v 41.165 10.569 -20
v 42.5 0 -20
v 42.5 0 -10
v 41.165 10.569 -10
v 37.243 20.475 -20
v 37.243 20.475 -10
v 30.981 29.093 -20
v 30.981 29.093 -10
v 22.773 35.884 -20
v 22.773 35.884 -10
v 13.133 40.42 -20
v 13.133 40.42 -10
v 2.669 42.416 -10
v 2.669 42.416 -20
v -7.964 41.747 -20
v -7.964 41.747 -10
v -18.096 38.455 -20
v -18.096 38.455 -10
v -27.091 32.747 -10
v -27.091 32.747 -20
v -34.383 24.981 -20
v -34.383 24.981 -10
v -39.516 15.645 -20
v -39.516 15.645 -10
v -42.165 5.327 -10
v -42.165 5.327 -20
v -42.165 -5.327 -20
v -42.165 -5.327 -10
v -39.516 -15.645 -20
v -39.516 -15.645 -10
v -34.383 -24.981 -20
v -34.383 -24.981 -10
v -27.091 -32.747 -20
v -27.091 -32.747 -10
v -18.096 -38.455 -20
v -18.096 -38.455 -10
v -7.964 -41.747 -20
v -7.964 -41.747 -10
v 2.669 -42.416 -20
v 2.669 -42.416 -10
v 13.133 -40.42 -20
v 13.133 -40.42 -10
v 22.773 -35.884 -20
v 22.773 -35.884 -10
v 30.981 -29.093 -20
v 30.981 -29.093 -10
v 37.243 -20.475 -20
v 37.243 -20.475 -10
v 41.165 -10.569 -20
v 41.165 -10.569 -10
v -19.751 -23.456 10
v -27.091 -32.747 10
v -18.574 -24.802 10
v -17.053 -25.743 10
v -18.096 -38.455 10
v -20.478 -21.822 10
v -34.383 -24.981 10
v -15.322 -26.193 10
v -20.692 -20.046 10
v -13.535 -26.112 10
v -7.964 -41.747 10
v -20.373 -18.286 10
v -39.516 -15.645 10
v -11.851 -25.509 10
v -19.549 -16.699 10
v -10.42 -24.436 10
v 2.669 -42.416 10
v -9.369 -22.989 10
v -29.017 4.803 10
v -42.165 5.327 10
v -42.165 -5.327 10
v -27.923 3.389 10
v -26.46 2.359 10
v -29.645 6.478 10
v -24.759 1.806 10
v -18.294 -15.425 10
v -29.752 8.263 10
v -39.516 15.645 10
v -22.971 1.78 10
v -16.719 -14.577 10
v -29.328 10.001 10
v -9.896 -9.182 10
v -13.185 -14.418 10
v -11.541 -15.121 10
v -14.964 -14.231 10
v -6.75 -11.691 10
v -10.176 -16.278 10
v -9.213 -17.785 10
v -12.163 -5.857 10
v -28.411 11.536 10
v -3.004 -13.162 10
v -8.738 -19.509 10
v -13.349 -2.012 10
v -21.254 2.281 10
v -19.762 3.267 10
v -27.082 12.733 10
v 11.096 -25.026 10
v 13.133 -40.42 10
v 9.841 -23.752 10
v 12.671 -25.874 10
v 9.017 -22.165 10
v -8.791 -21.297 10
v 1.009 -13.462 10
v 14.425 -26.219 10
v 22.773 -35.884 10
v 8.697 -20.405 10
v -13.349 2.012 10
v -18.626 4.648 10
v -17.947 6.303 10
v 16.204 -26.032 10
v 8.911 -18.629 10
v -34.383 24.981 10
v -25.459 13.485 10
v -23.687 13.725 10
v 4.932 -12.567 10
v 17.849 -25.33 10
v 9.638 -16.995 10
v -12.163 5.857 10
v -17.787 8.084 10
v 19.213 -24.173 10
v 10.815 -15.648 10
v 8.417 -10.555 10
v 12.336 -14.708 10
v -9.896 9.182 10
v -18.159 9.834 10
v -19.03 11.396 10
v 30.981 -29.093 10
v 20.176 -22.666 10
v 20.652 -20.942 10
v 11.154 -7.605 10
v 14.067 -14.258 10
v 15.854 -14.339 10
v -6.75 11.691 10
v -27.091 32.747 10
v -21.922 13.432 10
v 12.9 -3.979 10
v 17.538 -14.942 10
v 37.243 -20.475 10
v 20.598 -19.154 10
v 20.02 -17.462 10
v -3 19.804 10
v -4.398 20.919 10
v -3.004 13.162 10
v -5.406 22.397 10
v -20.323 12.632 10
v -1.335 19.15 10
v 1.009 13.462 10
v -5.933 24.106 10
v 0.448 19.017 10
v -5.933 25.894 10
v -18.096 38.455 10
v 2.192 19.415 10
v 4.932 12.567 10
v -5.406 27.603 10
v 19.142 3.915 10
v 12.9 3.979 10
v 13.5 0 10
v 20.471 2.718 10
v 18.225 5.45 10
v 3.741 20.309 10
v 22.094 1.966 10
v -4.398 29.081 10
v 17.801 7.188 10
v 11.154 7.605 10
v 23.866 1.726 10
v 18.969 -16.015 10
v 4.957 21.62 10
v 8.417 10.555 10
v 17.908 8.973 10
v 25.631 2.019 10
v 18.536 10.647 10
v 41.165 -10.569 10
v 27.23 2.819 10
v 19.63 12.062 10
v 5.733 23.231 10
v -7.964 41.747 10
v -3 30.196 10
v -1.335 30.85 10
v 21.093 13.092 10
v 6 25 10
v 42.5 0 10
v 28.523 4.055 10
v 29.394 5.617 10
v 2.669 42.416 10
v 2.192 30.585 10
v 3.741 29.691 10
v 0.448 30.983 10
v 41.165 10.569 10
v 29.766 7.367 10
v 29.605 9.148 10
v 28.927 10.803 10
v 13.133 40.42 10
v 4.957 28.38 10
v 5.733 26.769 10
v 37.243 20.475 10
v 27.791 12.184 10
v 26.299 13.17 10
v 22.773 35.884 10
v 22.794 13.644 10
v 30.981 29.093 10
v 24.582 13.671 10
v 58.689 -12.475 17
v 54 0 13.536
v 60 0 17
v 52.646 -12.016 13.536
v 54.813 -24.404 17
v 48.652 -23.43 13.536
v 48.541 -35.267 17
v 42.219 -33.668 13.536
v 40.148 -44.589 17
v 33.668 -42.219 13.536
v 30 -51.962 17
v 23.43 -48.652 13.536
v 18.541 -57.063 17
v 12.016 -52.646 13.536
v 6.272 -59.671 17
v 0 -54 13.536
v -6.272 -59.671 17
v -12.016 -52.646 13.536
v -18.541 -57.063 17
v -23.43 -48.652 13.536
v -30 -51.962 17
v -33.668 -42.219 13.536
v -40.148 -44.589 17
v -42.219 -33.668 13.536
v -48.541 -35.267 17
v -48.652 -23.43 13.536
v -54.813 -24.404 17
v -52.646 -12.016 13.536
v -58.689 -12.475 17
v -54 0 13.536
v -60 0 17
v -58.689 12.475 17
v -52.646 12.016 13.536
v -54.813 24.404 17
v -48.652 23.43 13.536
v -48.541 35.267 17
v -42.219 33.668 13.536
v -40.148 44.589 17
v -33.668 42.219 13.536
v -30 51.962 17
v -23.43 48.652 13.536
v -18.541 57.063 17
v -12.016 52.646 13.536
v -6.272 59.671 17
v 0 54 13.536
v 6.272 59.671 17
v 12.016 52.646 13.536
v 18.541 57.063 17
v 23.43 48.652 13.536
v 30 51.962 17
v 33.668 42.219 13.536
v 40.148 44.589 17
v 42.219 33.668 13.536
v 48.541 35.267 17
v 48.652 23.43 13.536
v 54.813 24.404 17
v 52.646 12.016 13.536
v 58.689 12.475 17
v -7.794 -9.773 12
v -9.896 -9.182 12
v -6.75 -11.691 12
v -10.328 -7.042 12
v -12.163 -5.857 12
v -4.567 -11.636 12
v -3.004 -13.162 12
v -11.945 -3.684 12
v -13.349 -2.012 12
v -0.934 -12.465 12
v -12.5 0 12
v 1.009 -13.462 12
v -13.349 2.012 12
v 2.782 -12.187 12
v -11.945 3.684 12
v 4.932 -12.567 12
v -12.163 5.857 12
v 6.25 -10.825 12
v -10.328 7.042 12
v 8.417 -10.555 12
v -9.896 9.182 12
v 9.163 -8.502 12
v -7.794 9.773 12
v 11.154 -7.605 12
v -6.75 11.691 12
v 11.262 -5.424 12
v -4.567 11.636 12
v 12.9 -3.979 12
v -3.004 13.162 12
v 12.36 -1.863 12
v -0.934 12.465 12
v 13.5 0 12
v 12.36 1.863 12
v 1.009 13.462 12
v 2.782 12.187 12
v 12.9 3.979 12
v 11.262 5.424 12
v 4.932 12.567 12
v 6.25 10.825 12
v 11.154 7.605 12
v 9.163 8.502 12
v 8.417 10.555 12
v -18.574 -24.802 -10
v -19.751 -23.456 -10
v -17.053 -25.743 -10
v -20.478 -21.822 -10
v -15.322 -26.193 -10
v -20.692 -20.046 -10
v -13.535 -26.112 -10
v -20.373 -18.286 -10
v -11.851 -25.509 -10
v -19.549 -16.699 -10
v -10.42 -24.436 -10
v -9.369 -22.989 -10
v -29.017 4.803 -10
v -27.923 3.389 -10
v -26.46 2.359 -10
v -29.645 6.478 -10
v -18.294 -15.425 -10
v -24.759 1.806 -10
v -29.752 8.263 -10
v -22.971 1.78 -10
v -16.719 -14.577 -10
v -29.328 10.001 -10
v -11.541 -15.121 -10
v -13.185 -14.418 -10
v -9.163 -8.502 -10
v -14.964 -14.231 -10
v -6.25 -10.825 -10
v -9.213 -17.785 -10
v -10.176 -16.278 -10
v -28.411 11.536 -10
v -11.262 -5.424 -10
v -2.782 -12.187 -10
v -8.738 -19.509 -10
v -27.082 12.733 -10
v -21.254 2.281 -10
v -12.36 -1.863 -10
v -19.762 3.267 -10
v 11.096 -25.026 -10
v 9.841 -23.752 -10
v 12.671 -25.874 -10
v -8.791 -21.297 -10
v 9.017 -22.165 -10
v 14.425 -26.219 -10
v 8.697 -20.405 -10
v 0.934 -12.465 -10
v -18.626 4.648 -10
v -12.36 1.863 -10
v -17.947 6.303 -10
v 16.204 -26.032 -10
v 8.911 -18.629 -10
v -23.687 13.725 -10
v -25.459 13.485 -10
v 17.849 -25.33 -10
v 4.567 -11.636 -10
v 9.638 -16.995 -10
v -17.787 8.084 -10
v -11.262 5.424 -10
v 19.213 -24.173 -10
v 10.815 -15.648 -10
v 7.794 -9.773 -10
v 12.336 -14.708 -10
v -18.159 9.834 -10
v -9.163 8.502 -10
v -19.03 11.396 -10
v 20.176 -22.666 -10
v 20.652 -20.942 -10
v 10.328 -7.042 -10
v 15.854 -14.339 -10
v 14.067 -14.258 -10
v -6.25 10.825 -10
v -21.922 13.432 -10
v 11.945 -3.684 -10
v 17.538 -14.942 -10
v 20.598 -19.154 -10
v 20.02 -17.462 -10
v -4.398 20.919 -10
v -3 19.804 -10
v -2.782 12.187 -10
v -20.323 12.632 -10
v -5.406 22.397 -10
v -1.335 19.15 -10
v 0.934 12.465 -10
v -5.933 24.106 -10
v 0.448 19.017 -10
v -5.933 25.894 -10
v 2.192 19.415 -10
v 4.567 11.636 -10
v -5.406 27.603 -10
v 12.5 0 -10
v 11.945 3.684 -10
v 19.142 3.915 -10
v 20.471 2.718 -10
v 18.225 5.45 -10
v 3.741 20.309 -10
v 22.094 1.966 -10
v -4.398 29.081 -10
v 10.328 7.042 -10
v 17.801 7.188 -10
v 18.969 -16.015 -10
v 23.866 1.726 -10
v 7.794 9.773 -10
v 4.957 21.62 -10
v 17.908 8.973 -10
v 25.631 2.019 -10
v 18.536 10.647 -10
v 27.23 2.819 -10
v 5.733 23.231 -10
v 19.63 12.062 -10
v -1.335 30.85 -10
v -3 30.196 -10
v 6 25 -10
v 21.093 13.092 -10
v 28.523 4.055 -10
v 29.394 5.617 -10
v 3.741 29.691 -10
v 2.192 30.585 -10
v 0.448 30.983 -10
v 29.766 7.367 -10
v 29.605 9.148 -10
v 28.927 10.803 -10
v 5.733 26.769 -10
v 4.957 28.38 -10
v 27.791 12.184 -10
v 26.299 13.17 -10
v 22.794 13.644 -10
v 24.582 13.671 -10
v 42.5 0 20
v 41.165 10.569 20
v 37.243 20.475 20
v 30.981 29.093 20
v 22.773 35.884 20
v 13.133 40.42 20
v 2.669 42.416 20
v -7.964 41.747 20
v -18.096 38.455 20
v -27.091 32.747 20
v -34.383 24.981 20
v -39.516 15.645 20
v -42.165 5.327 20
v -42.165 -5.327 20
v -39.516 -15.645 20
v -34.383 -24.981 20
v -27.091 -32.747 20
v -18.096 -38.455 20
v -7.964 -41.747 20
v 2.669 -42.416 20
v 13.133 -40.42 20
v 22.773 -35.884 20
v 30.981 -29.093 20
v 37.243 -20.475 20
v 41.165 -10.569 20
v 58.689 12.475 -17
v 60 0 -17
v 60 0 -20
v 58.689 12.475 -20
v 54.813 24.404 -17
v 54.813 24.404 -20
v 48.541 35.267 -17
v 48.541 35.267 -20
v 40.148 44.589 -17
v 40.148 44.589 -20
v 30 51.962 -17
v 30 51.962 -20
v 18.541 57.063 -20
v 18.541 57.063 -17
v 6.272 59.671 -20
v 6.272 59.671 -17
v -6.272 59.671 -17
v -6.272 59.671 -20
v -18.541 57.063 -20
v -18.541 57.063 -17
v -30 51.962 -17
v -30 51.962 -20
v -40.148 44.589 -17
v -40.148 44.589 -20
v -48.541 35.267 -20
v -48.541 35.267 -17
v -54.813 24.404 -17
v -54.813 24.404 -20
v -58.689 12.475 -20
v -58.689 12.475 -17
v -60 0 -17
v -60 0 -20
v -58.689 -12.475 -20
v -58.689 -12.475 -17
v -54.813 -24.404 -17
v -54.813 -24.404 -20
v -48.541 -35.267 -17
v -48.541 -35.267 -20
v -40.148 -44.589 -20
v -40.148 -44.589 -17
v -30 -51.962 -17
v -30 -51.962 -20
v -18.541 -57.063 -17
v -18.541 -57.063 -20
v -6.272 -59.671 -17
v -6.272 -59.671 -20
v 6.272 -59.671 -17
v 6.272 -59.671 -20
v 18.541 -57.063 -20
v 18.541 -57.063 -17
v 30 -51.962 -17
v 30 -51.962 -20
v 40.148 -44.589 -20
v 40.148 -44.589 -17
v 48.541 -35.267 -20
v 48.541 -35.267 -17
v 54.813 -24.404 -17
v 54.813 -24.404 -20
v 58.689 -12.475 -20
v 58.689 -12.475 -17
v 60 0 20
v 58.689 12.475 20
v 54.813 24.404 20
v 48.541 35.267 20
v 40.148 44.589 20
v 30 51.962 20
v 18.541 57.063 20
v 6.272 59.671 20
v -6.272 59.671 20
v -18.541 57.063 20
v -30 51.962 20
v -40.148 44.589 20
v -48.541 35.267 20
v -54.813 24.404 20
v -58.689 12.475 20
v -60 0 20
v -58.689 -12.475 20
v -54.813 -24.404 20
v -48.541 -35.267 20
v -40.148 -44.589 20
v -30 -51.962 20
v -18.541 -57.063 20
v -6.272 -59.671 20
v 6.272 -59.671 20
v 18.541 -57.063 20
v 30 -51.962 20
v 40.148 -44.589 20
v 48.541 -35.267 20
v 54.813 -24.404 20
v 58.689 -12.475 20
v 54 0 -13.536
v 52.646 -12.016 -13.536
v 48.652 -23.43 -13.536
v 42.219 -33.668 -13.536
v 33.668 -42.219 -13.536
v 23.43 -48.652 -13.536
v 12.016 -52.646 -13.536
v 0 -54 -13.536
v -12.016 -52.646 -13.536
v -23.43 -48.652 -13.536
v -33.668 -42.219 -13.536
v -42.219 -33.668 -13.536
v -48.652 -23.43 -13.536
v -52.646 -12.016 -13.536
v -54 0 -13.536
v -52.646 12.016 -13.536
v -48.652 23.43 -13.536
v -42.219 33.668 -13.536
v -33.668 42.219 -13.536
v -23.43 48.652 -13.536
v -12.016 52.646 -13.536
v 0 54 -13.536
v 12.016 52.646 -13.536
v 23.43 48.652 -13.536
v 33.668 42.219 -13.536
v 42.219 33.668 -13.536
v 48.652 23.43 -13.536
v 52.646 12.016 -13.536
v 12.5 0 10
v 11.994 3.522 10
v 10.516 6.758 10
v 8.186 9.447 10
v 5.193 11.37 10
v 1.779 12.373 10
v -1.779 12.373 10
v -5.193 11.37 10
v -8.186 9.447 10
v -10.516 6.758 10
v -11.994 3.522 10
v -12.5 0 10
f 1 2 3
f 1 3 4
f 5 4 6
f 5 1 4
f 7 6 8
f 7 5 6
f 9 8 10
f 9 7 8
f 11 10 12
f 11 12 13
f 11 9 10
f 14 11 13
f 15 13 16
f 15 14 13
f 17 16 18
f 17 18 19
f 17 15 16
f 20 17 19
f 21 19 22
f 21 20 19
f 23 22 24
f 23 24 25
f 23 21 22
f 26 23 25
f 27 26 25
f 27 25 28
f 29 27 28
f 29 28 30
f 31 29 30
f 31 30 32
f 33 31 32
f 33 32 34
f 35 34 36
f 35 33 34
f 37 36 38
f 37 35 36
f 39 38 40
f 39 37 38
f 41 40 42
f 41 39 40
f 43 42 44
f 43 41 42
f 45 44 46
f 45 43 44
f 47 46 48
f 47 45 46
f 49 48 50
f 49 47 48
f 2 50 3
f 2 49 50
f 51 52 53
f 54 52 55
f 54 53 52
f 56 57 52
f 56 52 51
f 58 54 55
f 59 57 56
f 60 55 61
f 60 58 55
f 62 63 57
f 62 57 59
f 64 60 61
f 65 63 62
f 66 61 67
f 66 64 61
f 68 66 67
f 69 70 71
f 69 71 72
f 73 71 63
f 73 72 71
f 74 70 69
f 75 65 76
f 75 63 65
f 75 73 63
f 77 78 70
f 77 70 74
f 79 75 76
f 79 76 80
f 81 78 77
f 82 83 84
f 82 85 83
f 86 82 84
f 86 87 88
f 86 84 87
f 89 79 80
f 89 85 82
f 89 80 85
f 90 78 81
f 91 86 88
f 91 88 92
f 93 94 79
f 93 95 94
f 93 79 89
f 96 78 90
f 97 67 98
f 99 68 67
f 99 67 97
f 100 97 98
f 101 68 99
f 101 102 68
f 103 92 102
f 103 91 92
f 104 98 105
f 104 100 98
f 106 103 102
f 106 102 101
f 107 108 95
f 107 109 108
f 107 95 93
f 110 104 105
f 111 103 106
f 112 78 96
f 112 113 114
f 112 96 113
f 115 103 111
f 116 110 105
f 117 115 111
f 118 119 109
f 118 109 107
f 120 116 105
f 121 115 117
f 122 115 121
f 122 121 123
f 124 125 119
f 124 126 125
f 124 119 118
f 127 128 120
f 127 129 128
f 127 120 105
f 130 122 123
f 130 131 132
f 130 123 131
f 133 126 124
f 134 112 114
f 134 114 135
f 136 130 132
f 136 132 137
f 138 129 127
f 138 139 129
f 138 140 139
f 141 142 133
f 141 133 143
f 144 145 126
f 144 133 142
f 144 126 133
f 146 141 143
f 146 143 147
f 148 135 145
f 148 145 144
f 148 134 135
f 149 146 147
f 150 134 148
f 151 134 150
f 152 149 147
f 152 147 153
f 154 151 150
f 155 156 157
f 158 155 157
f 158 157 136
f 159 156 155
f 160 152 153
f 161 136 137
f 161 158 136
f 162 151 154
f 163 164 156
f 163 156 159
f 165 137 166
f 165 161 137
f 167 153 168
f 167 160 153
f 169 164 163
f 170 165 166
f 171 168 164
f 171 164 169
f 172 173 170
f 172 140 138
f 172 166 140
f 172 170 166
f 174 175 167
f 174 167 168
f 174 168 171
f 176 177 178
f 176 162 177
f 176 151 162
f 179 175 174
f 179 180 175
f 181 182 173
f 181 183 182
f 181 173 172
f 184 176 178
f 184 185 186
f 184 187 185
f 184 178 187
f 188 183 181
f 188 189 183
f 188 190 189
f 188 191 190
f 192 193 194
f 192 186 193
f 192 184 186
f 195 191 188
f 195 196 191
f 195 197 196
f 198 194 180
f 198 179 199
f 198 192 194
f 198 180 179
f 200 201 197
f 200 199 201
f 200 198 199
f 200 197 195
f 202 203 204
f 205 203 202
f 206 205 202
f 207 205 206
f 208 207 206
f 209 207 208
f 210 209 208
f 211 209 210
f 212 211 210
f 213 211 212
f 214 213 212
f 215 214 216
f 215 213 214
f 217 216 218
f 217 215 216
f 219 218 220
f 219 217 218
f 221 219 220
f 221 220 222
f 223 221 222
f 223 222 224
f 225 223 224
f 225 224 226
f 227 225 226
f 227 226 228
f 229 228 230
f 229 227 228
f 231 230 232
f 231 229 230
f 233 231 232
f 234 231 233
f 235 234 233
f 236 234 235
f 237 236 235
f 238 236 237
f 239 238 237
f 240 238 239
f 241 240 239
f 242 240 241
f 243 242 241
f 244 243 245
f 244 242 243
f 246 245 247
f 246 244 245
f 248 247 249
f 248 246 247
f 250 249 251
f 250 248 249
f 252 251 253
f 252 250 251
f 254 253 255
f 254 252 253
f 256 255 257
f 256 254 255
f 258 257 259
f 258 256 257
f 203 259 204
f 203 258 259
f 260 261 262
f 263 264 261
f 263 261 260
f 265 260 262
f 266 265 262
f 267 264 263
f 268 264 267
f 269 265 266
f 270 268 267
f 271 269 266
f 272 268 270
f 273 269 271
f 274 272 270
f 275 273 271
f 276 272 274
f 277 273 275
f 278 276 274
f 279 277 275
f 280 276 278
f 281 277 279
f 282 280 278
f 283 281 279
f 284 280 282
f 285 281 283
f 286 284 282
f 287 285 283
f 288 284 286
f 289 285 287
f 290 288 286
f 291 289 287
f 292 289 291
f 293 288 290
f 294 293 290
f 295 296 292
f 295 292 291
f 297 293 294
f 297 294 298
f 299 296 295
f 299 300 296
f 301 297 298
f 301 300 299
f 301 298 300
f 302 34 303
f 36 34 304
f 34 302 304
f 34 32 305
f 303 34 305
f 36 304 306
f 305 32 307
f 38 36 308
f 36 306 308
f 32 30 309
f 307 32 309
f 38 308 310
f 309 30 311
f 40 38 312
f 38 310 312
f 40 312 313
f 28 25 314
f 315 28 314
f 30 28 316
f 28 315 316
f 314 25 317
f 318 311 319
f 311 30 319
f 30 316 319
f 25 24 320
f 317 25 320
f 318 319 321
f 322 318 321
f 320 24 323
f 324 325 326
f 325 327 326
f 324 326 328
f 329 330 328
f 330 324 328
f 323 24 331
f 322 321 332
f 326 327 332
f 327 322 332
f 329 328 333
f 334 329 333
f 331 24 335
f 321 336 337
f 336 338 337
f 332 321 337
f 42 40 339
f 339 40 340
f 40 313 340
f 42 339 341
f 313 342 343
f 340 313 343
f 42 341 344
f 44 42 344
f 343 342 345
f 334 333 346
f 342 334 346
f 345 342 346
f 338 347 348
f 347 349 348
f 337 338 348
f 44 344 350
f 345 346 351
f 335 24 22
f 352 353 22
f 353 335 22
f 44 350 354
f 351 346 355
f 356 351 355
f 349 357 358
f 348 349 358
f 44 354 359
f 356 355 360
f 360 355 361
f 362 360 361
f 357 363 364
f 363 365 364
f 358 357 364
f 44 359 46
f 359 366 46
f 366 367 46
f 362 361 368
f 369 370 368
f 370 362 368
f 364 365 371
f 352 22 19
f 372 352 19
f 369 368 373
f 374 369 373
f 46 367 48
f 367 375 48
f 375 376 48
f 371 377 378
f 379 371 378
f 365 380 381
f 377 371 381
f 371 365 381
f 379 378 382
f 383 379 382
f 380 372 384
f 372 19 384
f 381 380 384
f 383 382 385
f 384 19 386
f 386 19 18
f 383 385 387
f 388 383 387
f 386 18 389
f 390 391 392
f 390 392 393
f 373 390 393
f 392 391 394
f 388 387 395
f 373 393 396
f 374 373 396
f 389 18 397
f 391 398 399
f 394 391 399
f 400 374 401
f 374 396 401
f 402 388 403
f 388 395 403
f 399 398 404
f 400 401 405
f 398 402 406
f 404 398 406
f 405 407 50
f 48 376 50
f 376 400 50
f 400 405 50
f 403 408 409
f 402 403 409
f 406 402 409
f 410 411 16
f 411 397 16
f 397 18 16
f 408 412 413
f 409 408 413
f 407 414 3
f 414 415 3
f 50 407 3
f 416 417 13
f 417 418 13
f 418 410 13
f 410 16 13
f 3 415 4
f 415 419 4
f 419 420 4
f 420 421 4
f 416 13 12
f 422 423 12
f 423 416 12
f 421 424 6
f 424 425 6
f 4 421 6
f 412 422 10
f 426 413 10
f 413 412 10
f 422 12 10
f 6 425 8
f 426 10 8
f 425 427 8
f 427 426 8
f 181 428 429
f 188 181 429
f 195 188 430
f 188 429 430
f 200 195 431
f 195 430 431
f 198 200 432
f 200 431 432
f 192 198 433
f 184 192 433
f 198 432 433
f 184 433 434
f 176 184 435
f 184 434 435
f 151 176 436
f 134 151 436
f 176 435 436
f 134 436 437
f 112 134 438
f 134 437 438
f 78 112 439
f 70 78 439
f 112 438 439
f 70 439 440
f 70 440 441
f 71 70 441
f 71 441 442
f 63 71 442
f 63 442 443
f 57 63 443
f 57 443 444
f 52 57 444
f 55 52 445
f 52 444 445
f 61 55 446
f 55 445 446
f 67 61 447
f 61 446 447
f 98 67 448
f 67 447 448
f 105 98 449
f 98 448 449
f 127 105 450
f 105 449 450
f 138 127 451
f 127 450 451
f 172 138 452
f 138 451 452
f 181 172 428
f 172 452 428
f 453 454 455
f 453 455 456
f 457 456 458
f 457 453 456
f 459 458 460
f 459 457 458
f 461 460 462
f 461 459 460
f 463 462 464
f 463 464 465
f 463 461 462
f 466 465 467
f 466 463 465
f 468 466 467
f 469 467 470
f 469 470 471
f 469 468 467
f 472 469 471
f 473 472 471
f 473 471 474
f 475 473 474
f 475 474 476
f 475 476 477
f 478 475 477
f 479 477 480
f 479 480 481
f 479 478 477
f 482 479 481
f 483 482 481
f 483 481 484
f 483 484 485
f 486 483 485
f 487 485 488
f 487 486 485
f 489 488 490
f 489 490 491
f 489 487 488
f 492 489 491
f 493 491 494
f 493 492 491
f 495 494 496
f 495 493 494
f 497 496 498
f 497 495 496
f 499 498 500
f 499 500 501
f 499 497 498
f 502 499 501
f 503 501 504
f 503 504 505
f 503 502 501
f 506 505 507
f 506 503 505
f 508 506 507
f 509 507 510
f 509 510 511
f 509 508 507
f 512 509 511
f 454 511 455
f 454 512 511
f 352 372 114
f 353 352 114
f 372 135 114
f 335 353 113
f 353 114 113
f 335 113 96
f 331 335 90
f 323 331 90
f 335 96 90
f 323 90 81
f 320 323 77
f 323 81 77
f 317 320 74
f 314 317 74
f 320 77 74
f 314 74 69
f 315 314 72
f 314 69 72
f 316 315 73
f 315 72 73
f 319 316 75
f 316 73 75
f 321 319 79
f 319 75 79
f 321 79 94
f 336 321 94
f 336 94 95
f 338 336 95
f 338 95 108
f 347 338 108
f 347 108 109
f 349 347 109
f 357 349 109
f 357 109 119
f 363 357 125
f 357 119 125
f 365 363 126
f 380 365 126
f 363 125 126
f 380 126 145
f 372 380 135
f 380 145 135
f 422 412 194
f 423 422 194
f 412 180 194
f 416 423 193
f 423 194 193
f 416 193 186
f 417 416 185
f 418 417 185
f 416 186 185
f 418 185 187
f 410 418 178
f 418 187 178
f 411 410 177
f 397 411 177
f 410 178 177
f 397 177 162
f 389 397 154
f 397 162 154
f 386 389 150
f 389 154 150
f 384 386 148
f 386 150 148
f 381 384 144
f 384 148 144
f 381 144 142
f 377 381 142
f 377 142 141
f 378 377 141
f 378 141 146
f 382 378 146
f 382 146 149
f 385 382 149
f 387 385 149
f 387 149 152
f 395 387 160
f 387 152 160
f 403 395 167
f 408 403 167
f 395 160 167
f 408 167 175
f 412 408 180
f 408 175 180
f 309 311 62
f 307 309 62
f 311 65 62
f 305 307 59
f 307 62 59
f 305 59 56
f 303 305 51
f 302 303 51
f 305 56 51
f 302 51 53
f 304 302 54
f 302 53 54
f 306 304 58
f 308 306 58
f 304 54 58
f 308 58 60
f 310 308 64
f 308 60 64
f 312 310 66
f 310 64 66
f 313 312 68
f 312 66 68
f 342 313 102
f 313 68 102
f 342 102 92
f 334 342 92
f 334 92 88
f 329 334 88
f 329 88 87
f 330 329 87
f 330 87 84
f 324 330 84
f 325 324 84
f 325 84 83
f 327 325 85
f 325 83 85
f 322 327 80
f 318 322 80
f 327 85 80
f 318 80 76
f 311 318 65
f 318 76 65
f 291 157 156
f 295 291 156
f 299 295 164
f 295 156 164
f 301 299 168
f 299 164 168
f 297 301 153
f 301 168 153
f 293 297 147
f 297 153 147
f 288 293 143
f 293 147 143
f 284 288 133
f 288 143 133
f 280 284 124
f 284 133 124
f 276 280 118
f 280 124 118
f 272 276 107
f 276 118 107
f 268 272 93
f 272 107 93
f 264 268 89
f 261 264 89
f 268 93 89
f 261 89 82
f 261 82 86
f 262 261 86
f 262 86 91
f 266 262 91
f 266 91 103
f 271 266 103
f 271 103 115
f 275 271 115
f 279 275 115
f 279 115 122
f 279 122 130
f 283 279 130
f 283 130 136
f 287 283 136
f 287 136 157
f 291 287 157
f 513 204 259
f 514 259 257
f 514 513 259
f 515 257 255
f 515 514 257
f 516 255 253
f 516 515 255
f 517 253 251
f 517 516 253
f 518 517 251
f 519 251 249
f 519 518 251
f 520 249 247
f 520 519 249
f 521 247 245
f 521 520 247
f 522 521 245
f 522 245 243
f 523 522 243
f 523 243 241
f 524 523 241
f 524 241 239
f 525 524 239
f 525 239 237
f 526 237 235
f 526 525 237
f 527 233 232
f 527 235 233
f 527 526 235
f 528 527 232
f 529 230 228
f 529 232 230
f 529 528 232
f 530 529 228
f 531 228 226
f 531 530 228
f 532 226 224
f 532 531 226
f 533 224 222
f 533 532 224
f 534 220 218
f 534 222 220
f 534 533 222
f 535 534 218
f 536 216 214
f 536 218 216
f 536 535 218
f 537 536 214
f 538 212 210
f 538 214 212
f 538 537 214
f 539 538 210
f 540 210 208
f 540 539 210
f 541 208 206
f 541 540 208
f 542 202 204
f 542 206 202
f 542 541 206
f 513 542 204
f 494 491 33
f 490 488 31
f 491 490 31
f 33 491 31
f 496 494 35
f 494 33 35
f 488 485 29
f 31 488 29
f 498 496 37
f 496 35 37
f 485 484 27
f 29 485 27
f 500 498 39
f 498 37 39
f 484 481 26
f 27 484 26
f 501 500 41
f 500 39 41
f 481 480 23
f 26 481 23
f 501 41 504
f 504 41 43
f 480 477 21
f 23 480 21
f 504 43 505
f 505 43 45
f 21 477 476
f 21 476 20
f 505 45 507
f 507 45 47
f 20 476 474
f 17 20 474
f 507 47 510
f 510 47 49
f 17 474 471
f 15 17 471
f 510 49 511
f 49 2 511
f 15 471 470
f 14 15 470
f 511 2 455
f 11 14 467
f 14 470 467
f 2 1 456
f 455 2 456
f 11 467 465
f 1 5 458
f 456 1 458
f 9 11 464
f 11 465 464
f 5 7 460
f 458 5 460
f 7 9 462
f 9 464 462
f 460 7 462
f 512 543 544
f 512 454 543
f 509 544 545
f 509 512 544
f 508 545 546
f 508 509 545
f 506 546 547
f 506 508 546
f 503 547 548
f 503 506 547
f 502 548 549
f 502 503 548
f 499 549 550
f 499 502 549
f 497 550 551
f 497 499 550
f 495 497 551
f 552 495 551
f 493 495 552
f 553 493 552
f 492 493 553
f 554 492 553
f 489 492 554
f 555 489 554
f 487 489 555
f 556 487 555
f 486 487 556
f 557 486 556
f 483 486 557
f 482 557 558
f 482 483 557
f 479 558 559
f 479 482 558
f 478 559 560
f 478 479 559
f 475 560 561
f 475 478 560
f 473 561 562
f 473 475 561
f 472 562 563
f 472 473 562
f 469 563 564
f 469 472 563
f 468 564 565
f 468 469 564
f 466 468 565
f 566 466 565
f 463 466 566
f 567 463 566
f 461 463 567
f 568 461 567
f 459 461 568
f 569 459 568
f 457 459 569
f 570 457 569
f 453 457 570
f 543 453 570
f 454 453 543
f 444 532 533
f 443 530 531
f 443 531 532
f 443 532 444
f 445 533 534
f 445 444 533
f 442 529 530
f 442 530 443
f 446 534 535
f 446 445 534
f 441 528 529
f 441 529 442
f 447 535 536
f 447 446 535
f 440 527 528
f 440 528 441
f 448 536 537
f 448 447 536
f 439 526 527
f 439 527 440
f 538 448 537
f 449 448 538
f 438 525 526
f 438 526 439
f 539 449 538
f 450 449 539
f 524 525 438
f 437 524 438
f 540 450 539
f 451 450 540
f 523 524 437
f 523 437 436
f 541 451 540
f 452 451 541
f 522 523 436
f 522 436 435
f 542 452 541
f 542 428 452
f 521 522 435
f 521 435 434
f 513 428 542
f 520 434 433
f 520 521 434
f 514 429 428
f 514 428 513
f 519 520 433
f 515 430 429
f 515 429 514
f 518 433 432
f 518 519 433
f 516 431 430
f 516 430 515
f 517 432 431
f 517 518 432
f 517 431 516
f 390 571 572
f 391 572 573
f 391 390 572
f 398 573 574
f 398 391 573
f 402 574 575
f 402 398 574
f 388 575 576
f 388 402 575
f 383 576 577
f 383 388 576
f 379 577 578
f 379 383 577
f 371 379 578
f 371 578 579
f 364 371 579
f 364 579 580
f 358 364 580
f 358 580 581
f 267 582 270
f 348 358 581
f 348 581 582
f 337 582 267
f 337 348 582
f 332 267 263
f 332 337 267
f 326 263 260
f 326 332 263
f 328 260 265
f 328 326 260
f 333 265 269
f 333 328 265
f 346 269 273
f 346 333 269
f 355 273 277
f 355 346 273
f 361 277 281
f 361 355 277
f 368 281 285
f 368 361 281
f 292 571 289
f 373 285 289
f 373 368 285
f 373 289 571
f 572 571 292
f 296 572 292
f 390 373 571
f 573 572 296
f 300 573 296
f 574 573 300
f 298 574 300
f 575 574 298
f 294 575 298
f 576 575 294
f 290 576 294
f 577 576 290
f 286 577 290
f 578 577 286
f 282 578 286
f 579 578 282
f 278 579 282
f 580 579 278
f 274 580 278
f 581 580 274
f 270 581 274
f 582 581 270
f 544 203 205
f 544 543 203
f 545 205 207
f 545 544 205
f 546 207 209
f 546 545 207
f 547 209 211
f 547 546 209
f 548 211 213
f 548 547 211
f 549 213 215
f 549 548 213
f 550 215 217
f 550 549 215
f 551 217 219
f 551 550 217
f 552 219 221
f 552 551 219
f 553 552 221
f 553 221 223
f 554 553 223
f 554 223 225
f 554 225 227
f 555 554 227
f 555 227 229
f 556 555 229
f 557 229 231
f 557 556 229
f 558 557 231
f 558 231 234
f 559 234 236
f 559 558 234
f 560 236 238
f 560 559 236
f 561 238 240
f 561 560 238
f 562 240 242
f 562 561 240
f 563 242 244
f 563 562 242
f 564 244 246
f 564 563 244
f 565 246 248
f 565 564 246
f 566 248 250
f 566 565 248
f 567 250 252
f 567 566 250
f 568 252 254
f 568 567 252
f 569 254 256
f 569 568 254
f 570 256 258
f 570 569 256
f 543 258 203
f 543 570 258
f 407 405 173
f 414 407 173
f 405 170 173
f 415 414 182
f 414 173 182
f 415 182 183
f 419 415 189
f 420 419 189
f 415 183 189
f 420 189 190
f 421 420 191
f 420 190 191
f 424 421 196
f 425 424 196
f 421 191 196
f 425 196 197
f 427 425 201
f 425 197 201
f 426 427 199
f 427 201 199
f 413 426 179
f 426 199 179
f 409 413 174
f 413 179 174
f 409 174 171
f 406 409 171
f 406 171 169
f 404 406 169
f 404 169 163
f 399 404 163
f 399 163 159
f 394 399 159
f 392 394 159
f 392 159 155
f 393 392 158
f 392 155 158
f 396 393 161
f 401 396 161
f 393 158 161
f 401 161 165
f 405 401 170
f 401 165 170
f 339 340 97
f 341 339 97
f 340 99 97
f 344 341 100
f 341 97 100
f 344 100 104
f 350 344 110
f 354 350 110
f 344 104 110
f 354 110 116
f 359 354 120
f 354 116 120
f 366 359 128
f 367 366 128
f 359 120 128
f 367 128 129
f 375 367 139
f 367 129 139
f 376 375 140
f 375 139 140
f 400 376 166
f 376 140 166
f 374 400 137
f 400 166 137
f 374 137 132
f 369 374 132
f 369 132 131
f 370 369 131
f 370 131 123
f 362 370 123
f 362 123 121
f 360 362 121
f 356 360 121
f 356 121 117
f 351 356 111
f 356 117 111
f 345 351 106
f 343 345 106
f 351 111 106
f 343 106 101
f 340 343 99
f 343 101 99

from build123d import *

# Parameters (mm, degrees)
SKETCH2_R                = 60
SKETCH2_R_2              = 12.5
BOSS_EXTRUDE1_DEPTH      = 20
SKETCH3_R                = 42.5
CUT_EXTRUDE1_DEPTH       = 10
SKETCH4_R                = 6
CUT_EXTRUDE2_DEPTH       = 91
CIRPATTERN2_COUNT        = 5
BOSS_EXTRUDE3_DEPTH      = 2
BOSS_EXTRUDE3_DEPTH_BACK = 7
SKETCH6_R                = 13.5
SKETCH6_R_2              = 12.5


with BuildPart() as part:
    # Sketch2 → Boss-Extrude1 (new, symmetric)
    with BuildSketch(Plane.XY):
        Circle(SKETCH2_R)
        Circle(SKETCH2_R_2, mode=Mode.SUBTRACT)
    extrude(amount=BOSS_EXTRUDE1_DEPTH, both=True)

    # Sketch3 → Cut-Extrude1 (cut)
    with BuildSketch(Plane.XY.offset(20)):
        Circle(SKETCH3_R)
    cut_extrude1 = extrude(amount=-CUT_EXTRUDE1_DEPTH, mode=Mode.SUBTRACT)

    # Mirror2: Cut-Extrude1 across plane
    add(cut_extrude1.mirror(Plane.XY), mode=Mode.SUBTRACT)

    # Sketch4 → Cut-Extrude2 (cut, symmetric)
    with BuildSketch(Plane.XY.offset(10)):
        with Locations((0, 25)):
            Circle(SKETCH4_R)
    cut_extrude2 = extrude(amount=CUT_EXTRUDE2_DEPTH, both=True, mode=Mode.SUBTRACT)

    # CirPattern2: Cut-Extrude2 ×5 about axis
    cirpattern2_axis = Axis((0, 0, 0), (0, 0, 1))
    for i in range(1, CIRPATTERN2_COUNT):
        add(cut_extrude2.rotate(cirpattern2_axis, i * 360 / CIRPATTERN2_COUNT), mode=Mode.SUBTRACT)

    # Sketch5 → Cut-Revolve1 (revolve, cut)
    with BuildSketch(Plane(origin=(0, 0, 0), x_dir=(1, 0, 0), z_dir=(0, 1, 0))):
        Polygon((54, 13.535898385), (60, 17), (60, -17), (54, -13.535898385), align=None)
    revolve(axis=Axis((0, 0, 0), (0, 0, -1)), mode=Mode.SUBTRACT)

    # Sketch6 → Boss-Extrude3 (add, two sides: drawn at the far end of the back side and taken through both)
    with BuildSketch(Plane.XY.offset(10).offset(-BOSS_EXTRUDE3_DEPTH_BACK)):
        Circle(SKETCH6_R)
        with Locations(Location((0, 0, 0), (0, 0, 180))):
            Circle(SKETCH6_R_2, mode=Mode.SUBTRACT)
    extrude(amount=BOSS_EXTRUDE3_DEPTH + BOSS_EXTRUDE3_DEPTH_BACK)


solid = part.part
